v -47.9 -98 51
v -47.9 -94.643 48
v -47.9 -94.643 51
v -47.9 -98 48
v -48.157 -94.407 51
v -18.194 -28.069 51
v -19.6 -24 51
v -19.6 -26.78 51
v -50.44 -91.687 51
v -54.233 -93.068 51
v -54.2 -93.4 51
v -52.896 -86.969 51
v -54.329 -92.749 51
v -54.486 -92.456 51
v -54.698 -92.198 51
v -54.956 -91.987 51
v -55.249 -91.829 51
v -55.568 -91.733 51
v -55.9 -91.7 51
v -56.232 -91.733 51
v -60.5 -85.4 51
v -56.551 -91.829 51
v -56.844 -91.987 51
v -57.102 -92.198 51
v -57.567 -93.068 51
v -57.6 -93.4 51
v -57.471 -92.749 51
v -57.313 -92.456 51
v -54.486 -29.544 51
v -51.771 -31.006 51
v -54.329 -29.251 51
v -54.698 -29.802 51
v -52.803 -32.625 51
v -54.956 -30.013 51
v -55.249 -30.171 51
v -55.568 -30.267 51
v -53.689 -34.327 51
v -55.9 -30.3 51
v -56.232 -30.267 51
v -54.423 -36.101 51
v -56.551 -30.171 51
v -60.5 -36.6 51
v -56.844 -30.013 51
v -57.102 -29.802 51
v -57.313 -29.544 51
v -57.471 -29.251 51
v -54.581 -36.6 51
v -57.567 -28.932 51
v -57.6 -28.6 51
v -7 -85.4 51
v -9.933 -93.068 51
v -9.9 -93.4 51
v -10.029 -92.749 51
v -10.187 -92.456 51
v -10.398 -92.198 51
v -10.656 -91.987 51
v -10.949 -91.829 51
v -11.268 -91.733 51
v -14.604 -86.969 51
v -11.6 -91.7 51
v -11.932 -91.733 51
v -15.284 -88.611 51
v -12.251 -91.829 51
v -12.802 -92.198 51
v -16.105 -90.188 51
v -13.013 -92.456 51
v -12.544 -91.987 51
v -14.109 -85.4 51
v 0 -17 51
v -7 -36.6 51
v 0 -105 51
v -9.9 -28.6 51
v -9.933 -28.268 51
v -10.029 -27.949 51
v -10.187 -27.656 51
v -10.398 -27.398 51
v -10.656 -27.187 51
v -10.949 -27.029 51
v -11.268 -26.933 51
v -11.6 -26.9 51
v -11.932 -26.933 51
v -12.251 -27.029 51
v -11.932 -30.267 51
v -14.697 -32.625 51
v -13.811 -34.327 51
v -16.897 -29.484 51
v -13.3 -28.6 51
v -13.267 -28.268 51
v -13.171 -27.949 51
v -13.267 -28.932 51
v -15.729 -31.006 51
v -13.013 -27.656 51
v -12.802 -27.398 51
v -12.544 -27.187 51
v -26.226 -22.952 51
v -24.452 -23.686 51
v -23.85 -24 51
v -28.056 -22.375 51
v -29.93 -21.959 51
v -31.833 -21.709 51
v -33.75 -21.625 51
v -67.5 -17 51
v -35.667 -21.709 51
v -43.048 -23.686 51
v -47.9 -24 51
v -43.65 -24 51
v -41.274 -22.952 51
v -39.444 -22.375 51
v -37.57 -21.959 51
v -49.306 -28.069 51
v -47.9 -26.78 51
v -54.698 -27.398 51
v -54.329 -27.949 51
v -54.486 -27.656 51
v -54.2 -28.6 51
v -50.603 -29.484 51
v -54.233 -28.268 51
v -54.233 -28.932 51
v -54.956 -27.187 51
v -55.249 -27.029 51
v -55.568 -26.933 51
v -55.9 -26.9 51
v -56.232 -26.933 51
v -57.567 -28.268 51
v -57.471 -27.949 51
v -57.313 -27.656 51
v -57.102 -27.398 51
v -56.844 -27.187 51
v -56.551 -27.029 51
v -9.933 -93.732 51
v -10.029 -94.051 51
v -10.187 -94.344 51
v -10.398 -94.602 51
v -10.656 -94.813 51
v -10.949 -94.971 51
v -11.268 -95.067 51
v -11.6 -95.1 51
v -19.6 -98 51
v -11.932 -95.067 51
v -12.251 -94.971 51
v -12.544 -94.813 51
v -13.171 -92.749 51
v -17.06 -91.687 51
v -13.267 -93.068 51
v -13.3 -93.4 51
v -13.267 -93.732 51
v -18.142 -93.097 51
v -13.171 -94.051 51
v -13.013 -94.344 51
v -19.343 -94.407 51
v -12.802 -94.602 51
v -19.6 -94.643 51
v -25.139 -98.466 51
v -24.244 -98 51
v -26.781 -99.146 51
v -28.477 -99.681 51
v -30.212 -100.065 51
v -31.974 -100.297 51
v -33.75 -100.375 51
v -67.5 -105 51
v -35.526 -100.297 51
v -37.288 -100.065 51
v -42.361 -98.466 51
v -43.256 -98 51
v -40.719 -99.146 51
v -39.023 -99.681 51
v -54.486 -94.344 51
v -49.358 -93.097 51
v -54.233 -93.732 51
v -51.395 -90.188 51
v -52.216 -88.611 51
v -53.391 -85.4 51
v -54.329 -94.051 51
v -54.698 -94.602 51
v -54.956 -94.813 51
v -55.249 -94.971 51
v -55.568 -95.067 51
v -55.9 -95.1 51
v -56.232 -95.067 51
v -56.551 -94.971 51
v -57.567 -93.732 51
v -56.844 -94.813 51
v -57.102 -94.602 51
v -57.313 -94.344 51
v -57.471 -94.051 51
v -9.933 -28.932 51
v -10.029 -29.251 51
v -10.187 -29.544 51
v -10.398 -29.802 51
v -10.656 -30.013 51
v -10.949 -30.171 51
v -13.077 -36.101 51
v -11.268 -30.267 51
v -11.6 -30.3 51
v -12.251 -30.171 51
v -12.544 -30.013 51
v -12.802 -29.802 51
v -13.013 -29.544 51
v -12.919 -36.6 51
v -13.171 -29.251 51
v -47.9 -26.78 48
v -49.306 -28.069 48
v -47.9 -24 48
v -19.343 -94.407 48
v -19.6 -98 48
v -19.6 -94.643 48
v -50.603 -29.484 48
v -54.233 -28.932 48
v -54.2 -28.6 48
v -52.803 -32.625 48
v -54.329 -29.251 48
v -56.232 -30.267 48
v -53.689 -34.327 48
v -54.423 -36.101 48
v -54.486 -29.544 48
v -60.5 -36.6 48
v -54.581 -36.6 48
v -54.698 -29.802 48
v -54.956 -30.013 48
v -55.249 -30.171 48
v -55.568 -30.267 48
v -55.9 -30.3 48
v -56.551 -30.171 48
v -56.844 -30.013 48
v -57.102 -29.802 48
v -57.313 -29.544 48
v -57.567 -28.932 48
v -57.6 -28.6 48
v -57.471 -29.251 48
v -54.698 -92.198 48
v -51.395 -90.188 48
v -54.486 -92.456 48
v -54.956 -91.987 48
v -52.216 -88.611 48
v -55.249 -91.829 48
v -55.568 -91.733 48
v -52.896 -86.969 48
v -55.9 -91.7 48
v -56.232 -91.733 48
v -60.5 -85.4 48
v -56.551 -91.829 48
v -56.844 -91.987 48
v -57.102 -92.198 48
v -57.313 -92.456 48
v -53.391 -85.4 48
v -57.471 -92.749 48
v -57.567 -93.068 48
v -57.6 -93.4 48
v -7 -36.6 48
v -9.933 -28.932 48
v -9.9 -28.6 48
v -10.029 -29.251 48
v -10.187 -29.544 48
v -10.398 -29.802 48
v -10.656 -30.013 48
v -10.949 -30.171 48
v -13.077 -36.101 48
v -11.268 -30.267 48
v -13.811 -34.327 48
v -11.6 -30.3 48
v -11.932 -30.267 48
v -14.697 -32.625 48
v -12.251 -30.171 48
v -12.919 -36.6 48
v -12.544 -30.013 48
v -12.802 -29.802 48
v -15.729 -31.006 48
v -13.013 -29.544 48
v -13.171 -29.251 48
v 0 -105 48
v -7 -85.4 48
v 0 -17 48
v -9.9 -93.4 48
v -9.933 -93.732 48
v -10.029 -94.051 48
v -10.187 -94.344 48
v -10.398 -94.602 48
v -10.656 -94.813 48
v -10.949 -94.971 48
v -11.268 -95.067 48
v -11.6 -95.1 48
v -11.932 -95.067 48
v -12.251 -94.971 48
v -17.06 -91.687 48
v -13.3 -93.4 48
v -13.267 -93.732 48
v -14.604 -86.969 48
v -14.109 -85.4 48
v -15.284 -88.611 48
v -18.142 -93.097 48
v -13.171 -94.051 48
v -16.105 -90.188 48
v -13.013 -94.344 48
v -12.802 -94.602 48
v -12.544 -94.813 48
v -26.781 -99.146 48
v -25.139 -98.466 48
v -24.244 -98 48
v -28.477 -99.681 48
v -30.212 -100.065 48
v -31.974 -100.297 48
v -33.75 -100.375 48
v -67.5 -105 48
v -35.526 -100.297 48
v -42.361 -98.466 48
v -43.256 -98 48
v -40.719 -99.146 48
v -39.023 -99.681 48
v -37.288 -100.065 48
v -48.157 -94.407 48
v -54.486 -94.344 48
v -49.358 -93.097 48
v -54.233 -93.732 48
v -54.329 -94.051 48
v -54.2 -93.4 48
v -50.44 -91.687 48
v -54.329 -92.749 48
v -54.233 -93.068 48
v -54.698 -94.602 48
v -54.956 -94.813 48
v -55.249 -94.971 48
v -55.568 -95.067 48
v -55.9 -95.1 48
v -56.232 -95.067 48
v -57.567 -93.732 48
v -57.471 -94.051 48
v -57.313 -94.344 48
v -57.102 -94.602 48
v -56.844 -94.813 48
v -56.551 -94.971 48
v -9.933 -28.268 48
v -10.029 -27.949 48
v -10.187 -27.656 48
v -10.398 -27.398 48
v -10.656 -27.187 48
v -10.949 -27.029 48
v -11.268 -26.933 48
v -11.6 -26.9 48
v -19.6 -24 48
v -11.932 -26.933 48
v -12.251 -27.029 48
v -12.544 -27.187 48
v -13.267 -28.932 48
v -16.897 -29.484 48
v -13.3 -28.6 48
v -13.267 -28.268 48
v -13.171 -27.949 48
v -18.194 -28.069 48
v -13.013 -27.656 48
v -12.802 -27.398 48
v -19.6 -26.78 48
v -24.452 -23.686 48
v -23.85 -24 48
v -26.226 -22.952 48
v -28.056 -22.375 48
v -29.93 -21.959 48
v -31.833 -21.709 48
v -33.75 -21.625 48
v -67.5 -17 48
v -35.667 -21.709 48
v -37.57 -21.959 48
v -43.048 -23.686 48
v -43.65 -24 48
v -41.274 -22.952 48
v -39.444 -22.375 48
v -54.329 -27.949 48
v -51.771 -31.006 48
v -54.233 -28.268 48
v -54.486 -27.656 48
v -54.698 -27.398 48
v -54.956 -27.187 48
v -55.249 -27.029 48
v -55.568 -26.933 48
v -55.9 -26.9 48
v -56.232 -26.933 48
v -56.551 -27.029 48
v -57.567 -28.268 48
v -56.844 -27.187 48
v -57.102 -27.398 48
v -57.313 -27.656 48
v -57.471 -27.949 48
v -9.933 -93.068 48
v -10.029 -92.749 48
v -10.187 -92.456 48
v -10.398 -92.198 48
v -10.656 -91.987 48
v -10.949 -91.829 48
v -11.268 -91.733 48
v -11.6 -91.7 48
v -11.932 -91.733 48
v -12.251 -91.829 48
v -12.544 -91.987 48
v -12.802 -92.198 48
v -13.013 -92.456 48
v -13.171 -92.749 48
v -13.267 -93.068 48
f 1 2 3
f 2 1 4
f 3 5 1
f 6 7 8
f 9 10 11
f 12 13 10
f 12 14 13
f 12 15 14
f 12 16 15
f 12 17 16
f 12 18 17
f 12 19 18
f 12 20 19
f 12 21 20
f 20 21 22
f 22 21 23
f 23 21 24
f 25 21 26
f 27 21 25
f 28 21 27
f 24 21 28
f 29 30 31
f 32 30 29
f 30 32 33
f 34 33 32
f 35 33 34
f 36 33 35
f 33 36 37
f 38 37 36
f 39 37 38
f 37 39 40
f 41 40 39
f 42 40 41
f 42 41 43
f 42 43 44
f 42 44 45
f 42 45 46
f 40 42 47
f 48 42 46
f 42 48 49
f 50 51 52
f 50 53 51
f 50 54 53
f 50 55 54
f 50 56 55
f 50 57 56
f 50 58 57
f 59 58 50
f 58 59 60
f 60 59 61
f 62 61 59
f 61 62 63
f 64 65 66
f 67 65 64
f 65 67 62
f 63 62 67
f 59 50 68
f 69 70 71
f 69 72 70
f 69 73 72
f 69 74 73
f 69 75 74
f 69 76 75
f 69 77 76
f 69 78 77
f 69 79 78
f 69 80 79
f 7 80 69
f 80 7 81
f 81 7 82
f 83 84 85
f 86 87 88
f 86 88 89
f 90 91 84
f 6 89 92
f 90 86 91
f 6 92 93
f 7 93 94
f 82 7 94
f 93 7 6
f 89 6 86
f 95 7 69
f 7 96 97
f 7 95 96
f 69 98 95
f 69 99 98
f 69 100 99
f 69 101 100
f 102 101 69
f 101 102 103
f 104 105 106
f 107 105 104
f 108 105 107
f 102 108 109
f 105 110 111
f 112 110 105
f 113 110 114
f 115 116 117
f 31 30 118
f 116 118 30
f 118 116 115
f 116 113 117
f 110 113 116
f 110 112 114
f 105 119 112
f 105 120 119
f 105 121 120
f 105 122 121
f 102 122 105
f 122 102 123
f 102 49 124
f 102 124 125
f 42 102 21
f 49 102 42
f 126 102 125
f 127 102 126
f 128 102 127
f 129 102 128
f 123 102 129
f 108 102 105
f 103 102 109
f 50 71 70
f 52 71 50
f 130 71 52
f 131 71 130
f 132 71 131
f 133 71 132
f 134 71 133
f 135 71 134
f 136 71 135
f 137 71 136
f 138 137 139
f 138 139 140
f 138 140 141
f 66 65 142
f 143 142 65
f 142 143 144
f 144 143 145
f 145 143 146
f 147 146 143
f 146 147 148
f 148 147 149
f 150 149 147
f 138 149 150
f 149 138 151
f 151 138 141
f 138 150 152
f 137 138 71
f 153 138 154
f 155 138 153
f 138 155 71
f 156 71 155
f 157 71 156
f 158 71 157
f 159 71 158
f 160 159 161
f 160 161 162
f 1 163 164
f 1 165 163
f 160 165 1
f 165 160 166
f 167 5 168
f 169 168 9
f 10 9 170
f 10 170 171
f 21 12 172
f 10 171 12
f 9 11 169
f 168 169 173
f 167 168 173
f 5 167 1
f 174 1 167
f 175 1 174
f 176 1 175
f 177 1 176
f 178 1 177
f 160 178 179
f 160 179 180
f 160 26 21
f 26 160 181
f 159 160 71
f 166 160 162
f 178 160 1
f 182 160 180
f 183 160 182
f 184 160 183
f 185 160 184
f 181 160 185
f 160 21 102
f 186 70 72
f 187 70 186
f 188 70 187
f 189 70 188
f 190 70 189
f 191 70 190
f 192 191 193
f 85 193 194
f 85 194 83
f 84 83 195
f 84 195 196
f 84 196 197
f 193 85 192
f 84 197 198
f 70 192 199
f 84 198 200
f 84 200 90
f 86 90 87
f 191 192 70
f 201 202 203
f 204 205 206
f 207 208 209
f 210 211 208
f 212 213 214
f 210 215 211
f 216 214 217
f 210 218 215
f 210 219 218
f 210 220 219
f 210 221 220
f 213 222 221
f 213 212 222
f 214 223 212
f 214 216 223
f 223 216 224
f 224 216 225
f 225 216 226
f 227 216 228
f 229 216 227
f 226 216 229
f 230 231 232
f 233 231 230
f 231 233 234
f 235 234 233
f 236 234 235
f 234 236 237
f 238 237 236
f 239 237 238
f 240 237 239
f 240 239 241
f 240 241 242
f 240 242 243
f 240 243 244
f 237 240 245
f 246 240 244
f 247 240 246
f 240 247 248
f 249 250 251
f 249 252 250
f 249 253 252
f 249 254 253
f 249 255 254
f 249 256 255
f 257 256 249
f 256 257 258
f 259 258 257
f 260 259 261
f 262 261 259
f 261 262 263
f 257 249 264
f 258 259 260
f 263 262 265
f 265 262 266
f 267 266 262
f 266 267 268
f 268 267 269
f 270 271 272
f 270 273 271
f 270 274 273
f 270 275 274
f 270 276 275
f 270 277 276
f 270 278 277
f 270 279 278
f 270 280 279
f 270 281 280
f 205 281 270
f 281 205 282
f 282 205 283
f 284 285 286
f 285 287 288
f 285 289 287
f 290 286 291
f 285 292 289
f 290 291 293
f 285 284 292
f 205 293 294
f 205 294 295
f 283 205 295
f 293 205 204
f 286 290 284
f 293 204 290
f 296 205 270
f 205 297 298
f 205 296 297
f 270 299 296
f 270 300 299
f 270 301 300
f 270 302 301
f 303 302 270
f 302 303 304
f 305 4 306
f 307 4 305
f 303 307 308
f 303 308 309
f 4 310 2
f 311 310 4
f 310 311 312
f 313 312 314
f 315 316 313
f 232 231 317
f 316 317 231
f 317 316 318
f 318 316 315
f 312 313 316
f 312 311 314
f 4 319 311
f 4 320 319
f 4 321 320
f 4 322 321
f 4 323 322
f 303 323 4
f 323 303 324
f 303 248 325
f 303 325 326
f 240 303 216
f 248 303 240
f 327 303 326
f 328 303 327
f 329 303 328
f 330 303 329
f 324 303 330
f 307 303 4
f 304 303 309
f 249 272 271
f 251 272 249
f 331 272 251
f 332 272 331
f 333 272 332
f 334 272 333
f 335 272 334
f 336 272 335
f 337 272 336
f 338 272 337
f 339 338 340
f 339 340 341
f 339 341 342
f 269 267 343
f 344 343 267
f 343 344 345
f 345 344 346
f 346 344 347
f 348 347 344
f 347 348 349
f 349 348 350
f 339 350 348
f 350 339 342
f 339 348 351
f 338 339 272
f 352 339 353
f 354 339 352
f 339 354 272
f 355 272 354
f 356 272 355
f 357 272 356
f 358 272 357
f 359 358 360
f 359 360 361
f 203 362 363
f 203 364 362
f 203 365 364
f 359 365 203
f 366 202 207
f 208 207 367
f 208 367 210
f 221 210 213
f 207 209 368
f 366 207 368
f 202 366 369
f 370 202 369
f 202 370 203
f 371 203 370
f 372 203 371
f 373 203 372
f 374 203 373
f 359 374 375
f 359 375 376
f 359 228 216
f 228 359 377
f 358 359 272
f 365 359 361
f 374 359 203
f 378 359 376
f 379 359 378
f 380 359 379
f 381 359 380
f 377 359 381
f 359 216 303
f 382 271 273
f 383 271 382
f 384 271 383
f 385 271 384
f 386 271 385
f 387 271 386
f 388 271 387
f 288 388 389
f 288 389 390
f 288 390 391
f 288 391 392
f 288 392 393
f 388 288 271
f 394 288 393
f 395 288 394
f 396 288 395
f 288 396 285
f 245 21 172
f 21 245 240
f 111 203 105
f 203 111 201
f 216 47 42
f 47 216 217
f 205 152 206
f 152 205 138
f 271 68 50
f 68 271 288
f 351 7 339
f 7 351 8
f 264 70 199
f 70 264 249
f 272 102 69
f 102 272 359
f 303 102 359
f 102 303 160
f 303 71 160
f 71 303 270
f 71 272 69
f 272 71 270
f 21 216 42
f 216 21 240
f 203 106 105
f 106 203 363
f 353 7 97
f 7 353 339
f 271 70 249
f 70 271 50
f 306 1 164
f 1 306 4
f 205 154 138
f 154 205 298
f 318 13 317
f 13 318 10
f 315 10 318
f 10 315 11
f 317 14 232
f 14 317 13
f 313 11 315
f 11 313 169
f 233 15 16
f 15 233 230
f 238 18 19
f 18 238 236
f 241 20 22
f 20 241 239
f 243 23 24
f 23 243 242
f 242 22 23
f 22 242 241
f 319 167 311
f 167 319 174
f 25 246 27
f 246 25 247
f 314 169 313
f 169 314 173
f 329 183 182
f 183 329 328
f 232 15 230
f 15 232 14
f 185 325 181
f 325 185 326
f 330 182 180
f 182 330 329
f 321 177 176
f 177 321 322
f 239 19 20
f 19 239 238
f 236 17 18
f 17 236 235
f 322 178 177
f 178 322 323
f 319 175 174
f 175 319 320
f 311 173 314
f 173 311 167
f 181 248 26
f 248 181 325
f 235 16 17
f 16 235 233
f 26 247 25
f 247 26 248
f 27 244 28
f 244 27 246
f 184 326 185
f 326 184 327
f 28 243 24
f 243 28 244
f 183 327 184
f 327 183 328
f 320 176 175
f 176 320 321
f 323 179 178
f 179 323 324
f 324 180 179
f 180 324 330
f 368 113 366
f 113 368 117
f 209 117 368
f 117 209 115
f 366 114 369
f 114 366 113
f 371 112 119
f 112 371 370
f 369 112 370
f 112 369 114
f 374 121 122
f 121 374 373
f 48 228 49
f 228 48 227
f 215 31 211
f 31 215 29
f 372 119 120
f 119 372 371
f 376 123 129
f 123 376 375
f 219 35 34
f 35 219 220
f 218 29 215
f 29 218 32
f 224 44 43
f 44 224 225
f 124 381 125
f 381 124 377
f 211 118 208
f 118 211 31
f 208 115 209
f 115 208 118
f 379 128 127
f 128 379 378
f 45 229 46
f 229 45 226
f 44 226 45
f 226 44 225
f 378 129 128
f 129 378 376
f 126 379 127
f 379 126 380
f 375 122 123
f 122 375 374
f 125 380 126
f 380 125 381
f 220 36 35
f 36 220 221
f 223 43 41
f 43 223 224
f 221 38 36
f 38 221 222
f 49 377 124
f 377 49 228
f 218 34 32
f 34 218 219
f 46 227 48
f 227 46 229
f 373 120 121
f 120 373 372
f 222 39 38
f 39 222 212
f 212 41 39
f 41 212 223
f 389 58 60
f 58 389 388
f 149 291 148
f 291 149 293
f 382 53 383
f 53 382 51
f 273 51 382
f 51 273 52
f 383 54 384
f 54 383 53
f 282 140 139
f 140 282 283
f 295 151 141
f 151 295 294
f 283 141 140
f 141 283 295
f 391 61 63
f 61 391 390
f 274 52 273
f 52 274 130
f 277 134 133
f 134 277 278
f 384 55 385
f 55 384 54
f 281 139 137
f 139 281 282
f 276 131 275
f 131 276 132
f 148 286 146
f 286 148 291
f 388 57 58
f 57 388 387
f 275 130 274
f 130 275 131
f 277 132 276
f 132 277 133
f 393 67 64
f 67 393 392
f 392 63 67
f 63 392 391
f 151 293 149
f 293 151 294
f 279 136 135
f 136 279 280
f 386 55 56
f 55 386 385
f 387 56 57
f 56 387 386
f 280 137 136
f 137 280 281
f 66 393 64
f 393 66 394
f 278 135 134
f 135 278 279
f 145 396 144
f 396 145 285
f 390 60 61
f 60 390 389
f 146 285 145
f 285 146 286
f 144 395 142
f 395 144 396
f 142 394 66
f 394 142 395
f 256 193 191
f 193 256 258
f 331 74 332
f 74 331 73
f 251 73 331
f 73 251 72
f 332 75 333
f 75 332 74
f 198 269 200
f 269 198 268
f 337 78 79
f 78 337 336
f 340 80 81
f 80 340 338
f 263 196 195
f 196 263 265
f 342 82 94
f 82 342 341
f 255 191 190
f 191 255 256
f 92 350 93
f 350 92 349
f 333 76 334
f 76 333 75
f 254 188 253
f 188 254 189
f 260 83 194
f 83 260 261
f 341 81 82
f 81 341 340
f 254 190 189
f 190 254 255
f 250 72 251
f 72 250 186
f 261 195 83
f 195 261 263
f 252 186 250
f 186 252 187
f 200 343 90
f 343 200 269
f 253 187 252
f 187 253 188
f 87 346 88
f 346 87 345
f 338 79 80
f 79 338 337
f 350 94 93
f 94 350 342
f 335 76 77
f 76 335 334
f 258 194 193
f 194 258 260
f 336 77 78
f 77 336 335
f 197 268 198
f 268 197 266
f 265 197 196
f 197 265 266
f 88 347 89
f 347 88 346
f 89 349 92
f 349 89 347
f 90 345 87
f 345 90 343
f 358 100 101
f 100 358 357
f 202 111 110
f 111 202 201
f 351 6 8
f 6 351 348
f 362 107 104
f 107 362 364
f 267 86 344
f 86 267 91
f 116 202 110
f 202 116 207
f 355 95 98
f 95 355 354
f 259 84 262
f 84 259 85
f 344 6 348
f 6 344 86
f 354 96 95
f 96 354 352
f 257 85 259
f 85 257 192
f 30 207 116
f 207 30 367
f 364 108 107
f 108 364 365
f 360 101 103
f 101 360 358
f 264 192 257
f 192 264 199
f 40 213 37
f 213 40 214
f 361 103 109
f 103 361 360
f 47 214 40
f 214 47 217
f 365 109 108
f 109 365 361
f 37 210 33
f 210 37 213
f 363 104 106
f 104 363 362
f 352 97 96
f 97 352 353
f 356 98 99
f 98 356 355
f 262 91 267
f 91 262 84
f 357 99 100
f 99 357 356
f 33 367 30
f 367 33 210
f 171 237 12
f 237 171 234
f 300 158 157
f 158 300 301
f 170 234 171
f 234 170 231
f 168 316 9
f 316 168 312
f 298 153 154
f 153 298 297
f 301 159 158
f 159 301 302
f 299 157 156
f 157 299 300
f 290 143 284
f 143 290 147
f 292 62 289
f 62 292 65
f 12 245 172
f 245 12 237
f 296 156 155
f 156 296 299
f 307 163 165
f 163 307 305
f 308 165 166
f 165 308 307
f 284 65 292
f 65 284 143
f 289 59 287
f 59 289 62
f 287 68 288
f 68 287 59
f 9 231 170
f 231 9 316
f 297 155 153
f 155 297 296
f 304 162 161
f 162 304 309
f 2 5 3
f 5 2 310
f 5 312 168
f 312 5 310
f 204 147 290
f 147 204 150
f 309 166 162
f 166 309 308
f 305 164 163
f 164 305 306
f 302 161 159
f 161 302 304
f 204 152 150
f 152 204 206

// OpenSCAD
include <lib/defaults.scad>;
include <parts/cyberdeck.scad>;

color([0.78, 0.62, 0.08, 1])
  _chamber_keyboard_lid_support_rail(
    chamber_dome_roof_right_x(),
    0,
    chamber_keyboard_lid_front_edge_y(),
    chamber_keyboard_lid_back_edge_y,
    true
  );
